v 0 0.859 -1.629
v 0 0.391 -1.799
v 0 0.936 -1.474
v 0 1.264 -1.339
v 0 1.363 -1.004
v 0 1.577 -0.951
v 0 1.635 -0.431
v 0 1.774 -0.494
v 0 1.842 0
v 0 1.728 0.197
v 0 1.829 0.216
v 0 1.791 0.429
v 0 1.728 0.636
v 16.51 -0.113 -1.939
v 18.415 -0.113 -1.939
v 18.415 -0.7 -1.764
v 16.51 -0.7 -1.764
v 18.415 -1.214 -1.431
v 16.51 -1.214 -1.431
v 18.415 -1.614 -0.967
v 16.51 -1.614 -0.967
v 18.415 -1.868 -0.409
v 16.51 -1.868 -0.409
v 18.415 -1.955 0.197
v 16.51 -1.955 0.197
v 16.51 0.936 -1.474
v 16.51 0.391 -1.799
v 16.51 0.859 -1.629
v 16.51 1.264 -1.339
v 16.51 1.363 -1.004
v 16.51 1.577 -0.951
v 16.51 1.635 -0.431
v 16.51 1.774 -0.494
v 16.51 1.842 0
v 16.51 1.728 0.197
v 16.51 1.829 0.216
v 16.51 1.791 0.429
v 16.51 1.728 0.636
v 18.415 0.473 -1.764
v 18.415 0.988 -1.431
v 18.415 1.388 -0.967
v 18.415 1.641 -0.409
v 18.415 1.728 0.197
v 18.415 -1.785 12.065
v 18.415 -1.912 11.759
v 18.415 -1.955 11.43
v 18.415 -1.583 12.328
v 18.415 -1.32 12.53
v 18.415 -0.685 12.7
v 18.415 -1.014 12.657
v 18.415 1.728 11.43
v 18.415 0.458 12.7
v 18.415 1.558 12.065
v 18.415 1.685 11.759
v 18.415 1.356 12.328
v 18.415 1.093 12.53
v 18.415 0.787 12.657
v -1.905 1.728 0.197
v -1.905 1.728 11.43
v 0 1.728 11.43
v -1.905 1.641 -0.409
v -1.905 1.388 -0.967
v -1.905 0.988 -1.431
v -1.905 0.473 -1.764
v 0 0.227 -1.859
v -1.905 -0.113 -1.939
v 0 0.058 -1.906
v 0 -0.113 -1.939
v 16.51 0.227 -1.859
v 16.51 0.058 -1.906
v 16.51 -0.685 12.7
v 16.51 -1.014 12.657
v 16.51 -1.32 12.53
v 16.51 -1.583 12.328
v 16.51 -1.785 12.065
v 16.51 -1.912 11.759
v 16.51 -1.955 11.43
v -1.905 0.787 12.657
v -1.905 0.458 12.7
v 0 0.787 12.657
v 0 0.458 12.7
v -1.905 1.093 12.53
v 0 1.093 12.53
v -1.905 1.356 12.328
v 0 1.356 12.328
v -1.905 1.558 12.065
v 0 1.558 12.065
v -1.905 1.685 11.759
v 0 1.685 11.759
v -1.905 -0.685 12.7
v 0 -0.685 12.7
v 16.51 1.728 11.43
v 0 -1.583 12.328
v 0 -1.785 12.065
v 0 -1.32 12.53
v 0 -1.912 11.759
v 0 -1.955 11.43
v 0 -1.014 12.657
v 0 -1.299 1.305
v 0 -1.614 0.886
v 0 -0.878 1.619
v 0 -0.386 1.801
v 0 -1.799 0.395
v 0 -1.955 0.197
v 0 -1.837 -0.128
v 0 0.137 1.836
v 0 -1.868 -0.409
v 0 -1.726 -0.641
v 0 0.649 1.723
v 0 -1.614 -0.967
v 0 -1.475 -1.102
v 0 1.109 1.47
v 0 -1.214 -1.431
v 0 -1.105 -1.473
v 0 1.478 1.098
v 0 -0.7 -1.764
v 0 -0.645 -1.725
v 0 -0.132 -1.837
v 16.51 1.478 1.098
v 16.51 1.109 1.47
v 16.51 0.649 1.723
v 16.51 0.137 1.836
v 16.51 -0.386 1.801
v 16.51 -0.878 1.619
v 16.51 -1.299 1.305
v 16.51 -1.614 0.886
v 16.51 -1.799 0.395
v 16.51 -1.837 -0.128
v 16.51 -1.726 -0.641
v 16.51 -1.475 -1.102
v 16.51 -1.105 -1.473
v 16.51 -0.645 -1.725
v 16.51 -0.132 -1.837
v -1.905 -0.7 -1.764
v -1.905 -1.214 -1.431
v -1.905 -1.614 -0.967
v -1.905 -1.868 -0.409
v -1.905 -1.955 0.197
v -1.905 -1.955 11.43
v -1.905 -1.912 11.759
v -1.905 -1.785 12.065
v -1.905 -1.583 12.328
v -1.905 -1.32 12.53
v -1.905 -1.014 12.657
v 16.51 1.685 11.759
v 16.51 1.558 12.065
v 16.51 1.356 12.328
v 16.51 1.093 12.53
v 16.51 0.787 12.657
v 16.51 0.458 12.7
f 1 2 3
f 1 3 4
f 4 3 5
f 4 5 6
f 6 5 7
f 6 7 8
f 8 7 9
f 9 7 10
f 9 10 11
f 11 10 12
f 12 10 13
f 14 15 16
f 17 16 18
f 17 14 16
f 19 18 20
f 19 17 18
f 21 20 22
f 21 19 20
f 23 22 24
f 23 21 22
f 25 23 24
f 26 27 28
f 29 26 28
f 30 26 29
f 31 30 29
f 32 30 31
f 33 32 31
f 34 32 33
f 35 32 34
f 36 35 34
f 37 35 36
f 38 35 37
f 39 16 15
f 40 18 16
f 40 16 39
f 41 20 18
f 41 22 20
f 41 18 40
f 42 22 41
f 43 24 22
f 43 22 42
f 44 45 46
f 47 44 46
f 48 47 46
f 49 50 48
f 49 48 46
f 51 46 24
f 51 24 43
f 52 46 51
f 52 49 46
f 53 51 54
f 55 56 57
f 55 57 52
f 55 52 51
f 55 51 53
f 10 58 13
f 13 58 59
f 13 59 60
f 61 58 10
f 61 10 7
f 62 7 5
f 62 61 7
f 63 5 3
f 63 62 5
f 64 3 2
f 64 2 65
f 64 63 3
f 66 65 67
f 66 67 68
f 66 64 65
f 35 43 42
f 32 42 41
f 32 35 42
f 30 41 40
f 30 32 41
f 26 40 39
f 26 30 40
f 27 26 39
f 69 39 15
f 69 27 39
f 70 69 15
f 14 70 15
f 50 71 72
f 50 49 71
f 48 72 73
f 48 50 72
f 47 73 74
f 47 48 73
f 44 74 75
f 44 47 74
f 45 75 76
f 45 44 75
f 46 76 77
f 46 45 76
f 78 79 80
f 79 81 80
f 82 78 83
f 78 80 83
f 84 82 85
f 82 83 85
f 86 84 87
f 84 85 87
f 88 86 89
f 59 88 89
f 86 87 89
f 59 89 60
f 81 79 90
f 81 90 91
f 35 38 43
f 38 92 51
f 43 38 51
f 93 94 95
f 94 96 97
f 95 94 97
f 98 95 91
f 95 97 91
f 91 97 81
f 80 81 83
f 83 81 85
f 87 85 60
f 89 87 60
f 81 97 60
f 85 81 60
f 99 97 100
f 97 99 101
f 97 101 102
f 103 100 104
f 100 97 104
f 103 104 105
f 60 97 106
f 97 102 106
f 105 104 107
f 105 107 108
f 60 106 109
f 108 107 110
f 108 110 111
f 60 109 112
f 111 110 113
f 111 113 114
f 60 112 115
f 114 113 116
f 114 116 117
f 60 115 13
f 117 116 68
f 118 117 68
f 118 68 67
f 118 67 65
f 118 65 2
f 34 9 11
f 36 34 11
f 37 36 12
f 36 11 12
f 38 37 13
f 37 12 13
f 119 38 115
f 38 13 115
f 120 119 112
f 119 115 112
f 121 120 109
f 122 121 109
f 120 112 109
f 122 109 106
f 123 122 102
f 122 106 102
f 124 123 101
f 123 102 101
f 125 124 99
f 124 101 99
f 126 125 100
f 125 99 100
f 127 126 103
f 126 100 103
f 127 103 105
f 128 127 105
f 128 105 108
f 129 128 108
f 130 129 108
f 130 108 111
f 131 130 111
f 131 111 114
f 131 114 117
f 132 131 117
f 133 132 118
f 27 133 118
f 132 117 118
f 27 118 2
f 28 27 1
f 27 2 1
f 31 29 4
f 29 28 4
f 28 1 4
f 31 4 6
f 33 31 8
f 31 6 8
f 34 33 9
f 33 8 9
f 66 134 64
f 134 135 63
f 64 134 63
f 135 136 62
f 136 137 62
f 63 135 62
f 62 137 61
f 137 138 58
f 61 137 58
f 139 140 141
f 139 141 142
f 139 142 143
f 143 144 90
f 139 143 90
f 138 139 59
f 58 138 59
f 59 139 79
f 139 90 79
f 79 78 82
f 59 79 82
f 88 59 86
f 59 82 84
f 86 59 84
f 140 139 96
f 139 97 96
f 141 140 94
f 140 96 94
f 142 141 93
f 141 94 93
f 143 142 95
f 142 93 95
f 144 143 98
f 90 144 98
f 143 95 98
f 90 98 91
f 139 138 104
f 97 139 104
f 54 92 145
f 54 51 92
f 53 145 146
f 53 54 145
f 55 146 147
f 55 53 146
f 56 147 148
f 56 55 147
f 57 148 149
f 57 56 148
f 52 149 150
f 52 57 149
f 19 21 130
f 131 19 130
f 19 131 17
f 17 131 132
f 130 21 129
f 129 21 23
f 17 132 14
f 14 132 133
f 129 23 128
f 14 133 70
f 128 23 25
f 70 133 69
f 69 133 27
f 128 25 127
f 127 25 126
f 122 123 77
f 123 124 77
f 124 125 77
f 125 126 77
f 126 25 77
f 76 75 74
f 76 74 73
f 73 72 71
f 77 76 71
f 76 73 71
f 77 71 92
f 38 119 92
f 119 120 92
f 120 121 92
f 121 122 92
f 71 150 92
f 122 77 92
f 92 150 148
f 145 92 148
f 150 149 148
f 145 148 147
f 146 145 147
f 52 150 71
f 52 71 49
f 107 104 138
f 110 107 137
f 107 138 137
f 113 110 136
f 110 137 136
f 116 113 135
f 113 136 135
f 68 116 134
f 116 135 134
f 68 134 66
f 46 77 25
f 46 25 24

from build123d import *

# Parameters (mm, degrees)
F0_R          = 1.8415
F1_DEPTH      = 16.51
F2_W          = 1.905
F2_H          = 3.683
F3_DEPTH      = 12.7
F3_DEPTH_BACK = 1.96215
F4_T1_DEPTH   = 12.7
F4_T3_DEPTH   = 7.3025
F4_T5_DEPTH   = 12.7
F4_T7_DEPTH   = 7.3025
F5_R          = 1.27


# Not quite as in the source:
# - a fillet or chamfer that OpenCascade refuses, or shapes differently, is made with other operations: its cross-section is extruded or revolved along the edge and cut away or added


with BuildPart() as f1:
    # F0 (on Right) → F1 (new body)
    with BuildSketch(Plane.YZ):
        Circle(F0_R)
    extrude(amount=F1_DEPTH)

    # F2 (on Top) → F3 (join, two sides)
    with BuildSketch(Plane.XY) as f3_sk:
        with Locations((17.4625, -0.1134487624)):
            Rectangle(F2_W, F2_H)
        with Locations((-0.9525, -0.1134487624)):
            Rectangle(F2_W, F2_H)
    extrude(amount=F3_DEPTH)
    extrude(f3_sk.sketch, amount=-F3_DEPTH_BACK)

    # F4: fillet of radius 2.159 on 4 edges, made by hand

    # F4_s2 → F4_t1 (cut)
    with BuildSketch(Plane.YZ.offset(11.1125)):
        with BuildLine():
            ThreePointArc((0.2040512376, -1.96215), (-1.322592303, -1.3297935406), (-1.9549487624, 0.19685))
            Line((-1.9549487624, 0.19685), (-1.9549487624, -1.96215))
            Line((-1.9549487624, -1.96215), (0.2040512376, -1.96215))
        make_face()
    extrude(amount=F4_T1_DEPTH, mode=Mode.SUBTRACT)

    # F4_s4 → F4_t3 (cut)
    with BuildSketch(Plane.YZ.offset(16.51)):
        with BuildLine():
            ThreePointArc((1.7280512376, 0.19685), (1.0956947782, -1.3297935406), (-0.4309487624, -1.96215))
            Line((-0.4309487624, -1.96215), (1.7280512376, -1.96215))
            Line((1.7280512376, -1.96215), (1.7280512376, 0.19685))
        make_face()
    extrude(amount=F4_T3_DEPTH, mode=Mode.SUBTRACT)

    # F4_s6 → F4_t5 (cut)
    with BuildSketch(Plane.YZ.offset(-7.3025)):
        with BuildLine():
            ThreePointArc((-1.9549487624, 0.19685), (-1.322592303, -1.3297935406), (0.2040512376, -1.96215))
            Line((0.2040512376, -1.96215), (-1.9549487624, -1.96215))
            Line((-1.9549487624, -1.96215), (-1.9549487624, 0.19685))
        make_face()
    extrude(amount=F4_T5_DEPTH, mode=Mode.SUBTRACT)

    # F4_s8 → F4_t7 (cut)
    with BuildSketch(Plane.YZ.offset(-7.3025)):
        with BuildLine():
            ThreePointArc((1.7280512376, 0.19685), (1.0956947782, -1.3297935406), (-0.4309487624, -1.96215))
            Line((-0.4309487624, -1.96215), (1.7280512376, -1.96215))
            Line((1.7280512376, -1.96215), (1.7280512376, 0.19685))
        make_face()
    extrude(amount=F4_T7_DEPTH, mode=Mode.SUBTRACT)

    # F5
    f5_edges = [f1.edges().sort_by_distance(p)[0] for p in [
        (-0.9525, -1.954949, 12.7),
        (-0.9525, 1.728051, 12.7),
        (17.4625, 1.728051, 12.7),
        (17.4625, -1.954949, 12.7),
    ]]
    fillet(f5_edges, radius=F5_R)


solid = f1.part
